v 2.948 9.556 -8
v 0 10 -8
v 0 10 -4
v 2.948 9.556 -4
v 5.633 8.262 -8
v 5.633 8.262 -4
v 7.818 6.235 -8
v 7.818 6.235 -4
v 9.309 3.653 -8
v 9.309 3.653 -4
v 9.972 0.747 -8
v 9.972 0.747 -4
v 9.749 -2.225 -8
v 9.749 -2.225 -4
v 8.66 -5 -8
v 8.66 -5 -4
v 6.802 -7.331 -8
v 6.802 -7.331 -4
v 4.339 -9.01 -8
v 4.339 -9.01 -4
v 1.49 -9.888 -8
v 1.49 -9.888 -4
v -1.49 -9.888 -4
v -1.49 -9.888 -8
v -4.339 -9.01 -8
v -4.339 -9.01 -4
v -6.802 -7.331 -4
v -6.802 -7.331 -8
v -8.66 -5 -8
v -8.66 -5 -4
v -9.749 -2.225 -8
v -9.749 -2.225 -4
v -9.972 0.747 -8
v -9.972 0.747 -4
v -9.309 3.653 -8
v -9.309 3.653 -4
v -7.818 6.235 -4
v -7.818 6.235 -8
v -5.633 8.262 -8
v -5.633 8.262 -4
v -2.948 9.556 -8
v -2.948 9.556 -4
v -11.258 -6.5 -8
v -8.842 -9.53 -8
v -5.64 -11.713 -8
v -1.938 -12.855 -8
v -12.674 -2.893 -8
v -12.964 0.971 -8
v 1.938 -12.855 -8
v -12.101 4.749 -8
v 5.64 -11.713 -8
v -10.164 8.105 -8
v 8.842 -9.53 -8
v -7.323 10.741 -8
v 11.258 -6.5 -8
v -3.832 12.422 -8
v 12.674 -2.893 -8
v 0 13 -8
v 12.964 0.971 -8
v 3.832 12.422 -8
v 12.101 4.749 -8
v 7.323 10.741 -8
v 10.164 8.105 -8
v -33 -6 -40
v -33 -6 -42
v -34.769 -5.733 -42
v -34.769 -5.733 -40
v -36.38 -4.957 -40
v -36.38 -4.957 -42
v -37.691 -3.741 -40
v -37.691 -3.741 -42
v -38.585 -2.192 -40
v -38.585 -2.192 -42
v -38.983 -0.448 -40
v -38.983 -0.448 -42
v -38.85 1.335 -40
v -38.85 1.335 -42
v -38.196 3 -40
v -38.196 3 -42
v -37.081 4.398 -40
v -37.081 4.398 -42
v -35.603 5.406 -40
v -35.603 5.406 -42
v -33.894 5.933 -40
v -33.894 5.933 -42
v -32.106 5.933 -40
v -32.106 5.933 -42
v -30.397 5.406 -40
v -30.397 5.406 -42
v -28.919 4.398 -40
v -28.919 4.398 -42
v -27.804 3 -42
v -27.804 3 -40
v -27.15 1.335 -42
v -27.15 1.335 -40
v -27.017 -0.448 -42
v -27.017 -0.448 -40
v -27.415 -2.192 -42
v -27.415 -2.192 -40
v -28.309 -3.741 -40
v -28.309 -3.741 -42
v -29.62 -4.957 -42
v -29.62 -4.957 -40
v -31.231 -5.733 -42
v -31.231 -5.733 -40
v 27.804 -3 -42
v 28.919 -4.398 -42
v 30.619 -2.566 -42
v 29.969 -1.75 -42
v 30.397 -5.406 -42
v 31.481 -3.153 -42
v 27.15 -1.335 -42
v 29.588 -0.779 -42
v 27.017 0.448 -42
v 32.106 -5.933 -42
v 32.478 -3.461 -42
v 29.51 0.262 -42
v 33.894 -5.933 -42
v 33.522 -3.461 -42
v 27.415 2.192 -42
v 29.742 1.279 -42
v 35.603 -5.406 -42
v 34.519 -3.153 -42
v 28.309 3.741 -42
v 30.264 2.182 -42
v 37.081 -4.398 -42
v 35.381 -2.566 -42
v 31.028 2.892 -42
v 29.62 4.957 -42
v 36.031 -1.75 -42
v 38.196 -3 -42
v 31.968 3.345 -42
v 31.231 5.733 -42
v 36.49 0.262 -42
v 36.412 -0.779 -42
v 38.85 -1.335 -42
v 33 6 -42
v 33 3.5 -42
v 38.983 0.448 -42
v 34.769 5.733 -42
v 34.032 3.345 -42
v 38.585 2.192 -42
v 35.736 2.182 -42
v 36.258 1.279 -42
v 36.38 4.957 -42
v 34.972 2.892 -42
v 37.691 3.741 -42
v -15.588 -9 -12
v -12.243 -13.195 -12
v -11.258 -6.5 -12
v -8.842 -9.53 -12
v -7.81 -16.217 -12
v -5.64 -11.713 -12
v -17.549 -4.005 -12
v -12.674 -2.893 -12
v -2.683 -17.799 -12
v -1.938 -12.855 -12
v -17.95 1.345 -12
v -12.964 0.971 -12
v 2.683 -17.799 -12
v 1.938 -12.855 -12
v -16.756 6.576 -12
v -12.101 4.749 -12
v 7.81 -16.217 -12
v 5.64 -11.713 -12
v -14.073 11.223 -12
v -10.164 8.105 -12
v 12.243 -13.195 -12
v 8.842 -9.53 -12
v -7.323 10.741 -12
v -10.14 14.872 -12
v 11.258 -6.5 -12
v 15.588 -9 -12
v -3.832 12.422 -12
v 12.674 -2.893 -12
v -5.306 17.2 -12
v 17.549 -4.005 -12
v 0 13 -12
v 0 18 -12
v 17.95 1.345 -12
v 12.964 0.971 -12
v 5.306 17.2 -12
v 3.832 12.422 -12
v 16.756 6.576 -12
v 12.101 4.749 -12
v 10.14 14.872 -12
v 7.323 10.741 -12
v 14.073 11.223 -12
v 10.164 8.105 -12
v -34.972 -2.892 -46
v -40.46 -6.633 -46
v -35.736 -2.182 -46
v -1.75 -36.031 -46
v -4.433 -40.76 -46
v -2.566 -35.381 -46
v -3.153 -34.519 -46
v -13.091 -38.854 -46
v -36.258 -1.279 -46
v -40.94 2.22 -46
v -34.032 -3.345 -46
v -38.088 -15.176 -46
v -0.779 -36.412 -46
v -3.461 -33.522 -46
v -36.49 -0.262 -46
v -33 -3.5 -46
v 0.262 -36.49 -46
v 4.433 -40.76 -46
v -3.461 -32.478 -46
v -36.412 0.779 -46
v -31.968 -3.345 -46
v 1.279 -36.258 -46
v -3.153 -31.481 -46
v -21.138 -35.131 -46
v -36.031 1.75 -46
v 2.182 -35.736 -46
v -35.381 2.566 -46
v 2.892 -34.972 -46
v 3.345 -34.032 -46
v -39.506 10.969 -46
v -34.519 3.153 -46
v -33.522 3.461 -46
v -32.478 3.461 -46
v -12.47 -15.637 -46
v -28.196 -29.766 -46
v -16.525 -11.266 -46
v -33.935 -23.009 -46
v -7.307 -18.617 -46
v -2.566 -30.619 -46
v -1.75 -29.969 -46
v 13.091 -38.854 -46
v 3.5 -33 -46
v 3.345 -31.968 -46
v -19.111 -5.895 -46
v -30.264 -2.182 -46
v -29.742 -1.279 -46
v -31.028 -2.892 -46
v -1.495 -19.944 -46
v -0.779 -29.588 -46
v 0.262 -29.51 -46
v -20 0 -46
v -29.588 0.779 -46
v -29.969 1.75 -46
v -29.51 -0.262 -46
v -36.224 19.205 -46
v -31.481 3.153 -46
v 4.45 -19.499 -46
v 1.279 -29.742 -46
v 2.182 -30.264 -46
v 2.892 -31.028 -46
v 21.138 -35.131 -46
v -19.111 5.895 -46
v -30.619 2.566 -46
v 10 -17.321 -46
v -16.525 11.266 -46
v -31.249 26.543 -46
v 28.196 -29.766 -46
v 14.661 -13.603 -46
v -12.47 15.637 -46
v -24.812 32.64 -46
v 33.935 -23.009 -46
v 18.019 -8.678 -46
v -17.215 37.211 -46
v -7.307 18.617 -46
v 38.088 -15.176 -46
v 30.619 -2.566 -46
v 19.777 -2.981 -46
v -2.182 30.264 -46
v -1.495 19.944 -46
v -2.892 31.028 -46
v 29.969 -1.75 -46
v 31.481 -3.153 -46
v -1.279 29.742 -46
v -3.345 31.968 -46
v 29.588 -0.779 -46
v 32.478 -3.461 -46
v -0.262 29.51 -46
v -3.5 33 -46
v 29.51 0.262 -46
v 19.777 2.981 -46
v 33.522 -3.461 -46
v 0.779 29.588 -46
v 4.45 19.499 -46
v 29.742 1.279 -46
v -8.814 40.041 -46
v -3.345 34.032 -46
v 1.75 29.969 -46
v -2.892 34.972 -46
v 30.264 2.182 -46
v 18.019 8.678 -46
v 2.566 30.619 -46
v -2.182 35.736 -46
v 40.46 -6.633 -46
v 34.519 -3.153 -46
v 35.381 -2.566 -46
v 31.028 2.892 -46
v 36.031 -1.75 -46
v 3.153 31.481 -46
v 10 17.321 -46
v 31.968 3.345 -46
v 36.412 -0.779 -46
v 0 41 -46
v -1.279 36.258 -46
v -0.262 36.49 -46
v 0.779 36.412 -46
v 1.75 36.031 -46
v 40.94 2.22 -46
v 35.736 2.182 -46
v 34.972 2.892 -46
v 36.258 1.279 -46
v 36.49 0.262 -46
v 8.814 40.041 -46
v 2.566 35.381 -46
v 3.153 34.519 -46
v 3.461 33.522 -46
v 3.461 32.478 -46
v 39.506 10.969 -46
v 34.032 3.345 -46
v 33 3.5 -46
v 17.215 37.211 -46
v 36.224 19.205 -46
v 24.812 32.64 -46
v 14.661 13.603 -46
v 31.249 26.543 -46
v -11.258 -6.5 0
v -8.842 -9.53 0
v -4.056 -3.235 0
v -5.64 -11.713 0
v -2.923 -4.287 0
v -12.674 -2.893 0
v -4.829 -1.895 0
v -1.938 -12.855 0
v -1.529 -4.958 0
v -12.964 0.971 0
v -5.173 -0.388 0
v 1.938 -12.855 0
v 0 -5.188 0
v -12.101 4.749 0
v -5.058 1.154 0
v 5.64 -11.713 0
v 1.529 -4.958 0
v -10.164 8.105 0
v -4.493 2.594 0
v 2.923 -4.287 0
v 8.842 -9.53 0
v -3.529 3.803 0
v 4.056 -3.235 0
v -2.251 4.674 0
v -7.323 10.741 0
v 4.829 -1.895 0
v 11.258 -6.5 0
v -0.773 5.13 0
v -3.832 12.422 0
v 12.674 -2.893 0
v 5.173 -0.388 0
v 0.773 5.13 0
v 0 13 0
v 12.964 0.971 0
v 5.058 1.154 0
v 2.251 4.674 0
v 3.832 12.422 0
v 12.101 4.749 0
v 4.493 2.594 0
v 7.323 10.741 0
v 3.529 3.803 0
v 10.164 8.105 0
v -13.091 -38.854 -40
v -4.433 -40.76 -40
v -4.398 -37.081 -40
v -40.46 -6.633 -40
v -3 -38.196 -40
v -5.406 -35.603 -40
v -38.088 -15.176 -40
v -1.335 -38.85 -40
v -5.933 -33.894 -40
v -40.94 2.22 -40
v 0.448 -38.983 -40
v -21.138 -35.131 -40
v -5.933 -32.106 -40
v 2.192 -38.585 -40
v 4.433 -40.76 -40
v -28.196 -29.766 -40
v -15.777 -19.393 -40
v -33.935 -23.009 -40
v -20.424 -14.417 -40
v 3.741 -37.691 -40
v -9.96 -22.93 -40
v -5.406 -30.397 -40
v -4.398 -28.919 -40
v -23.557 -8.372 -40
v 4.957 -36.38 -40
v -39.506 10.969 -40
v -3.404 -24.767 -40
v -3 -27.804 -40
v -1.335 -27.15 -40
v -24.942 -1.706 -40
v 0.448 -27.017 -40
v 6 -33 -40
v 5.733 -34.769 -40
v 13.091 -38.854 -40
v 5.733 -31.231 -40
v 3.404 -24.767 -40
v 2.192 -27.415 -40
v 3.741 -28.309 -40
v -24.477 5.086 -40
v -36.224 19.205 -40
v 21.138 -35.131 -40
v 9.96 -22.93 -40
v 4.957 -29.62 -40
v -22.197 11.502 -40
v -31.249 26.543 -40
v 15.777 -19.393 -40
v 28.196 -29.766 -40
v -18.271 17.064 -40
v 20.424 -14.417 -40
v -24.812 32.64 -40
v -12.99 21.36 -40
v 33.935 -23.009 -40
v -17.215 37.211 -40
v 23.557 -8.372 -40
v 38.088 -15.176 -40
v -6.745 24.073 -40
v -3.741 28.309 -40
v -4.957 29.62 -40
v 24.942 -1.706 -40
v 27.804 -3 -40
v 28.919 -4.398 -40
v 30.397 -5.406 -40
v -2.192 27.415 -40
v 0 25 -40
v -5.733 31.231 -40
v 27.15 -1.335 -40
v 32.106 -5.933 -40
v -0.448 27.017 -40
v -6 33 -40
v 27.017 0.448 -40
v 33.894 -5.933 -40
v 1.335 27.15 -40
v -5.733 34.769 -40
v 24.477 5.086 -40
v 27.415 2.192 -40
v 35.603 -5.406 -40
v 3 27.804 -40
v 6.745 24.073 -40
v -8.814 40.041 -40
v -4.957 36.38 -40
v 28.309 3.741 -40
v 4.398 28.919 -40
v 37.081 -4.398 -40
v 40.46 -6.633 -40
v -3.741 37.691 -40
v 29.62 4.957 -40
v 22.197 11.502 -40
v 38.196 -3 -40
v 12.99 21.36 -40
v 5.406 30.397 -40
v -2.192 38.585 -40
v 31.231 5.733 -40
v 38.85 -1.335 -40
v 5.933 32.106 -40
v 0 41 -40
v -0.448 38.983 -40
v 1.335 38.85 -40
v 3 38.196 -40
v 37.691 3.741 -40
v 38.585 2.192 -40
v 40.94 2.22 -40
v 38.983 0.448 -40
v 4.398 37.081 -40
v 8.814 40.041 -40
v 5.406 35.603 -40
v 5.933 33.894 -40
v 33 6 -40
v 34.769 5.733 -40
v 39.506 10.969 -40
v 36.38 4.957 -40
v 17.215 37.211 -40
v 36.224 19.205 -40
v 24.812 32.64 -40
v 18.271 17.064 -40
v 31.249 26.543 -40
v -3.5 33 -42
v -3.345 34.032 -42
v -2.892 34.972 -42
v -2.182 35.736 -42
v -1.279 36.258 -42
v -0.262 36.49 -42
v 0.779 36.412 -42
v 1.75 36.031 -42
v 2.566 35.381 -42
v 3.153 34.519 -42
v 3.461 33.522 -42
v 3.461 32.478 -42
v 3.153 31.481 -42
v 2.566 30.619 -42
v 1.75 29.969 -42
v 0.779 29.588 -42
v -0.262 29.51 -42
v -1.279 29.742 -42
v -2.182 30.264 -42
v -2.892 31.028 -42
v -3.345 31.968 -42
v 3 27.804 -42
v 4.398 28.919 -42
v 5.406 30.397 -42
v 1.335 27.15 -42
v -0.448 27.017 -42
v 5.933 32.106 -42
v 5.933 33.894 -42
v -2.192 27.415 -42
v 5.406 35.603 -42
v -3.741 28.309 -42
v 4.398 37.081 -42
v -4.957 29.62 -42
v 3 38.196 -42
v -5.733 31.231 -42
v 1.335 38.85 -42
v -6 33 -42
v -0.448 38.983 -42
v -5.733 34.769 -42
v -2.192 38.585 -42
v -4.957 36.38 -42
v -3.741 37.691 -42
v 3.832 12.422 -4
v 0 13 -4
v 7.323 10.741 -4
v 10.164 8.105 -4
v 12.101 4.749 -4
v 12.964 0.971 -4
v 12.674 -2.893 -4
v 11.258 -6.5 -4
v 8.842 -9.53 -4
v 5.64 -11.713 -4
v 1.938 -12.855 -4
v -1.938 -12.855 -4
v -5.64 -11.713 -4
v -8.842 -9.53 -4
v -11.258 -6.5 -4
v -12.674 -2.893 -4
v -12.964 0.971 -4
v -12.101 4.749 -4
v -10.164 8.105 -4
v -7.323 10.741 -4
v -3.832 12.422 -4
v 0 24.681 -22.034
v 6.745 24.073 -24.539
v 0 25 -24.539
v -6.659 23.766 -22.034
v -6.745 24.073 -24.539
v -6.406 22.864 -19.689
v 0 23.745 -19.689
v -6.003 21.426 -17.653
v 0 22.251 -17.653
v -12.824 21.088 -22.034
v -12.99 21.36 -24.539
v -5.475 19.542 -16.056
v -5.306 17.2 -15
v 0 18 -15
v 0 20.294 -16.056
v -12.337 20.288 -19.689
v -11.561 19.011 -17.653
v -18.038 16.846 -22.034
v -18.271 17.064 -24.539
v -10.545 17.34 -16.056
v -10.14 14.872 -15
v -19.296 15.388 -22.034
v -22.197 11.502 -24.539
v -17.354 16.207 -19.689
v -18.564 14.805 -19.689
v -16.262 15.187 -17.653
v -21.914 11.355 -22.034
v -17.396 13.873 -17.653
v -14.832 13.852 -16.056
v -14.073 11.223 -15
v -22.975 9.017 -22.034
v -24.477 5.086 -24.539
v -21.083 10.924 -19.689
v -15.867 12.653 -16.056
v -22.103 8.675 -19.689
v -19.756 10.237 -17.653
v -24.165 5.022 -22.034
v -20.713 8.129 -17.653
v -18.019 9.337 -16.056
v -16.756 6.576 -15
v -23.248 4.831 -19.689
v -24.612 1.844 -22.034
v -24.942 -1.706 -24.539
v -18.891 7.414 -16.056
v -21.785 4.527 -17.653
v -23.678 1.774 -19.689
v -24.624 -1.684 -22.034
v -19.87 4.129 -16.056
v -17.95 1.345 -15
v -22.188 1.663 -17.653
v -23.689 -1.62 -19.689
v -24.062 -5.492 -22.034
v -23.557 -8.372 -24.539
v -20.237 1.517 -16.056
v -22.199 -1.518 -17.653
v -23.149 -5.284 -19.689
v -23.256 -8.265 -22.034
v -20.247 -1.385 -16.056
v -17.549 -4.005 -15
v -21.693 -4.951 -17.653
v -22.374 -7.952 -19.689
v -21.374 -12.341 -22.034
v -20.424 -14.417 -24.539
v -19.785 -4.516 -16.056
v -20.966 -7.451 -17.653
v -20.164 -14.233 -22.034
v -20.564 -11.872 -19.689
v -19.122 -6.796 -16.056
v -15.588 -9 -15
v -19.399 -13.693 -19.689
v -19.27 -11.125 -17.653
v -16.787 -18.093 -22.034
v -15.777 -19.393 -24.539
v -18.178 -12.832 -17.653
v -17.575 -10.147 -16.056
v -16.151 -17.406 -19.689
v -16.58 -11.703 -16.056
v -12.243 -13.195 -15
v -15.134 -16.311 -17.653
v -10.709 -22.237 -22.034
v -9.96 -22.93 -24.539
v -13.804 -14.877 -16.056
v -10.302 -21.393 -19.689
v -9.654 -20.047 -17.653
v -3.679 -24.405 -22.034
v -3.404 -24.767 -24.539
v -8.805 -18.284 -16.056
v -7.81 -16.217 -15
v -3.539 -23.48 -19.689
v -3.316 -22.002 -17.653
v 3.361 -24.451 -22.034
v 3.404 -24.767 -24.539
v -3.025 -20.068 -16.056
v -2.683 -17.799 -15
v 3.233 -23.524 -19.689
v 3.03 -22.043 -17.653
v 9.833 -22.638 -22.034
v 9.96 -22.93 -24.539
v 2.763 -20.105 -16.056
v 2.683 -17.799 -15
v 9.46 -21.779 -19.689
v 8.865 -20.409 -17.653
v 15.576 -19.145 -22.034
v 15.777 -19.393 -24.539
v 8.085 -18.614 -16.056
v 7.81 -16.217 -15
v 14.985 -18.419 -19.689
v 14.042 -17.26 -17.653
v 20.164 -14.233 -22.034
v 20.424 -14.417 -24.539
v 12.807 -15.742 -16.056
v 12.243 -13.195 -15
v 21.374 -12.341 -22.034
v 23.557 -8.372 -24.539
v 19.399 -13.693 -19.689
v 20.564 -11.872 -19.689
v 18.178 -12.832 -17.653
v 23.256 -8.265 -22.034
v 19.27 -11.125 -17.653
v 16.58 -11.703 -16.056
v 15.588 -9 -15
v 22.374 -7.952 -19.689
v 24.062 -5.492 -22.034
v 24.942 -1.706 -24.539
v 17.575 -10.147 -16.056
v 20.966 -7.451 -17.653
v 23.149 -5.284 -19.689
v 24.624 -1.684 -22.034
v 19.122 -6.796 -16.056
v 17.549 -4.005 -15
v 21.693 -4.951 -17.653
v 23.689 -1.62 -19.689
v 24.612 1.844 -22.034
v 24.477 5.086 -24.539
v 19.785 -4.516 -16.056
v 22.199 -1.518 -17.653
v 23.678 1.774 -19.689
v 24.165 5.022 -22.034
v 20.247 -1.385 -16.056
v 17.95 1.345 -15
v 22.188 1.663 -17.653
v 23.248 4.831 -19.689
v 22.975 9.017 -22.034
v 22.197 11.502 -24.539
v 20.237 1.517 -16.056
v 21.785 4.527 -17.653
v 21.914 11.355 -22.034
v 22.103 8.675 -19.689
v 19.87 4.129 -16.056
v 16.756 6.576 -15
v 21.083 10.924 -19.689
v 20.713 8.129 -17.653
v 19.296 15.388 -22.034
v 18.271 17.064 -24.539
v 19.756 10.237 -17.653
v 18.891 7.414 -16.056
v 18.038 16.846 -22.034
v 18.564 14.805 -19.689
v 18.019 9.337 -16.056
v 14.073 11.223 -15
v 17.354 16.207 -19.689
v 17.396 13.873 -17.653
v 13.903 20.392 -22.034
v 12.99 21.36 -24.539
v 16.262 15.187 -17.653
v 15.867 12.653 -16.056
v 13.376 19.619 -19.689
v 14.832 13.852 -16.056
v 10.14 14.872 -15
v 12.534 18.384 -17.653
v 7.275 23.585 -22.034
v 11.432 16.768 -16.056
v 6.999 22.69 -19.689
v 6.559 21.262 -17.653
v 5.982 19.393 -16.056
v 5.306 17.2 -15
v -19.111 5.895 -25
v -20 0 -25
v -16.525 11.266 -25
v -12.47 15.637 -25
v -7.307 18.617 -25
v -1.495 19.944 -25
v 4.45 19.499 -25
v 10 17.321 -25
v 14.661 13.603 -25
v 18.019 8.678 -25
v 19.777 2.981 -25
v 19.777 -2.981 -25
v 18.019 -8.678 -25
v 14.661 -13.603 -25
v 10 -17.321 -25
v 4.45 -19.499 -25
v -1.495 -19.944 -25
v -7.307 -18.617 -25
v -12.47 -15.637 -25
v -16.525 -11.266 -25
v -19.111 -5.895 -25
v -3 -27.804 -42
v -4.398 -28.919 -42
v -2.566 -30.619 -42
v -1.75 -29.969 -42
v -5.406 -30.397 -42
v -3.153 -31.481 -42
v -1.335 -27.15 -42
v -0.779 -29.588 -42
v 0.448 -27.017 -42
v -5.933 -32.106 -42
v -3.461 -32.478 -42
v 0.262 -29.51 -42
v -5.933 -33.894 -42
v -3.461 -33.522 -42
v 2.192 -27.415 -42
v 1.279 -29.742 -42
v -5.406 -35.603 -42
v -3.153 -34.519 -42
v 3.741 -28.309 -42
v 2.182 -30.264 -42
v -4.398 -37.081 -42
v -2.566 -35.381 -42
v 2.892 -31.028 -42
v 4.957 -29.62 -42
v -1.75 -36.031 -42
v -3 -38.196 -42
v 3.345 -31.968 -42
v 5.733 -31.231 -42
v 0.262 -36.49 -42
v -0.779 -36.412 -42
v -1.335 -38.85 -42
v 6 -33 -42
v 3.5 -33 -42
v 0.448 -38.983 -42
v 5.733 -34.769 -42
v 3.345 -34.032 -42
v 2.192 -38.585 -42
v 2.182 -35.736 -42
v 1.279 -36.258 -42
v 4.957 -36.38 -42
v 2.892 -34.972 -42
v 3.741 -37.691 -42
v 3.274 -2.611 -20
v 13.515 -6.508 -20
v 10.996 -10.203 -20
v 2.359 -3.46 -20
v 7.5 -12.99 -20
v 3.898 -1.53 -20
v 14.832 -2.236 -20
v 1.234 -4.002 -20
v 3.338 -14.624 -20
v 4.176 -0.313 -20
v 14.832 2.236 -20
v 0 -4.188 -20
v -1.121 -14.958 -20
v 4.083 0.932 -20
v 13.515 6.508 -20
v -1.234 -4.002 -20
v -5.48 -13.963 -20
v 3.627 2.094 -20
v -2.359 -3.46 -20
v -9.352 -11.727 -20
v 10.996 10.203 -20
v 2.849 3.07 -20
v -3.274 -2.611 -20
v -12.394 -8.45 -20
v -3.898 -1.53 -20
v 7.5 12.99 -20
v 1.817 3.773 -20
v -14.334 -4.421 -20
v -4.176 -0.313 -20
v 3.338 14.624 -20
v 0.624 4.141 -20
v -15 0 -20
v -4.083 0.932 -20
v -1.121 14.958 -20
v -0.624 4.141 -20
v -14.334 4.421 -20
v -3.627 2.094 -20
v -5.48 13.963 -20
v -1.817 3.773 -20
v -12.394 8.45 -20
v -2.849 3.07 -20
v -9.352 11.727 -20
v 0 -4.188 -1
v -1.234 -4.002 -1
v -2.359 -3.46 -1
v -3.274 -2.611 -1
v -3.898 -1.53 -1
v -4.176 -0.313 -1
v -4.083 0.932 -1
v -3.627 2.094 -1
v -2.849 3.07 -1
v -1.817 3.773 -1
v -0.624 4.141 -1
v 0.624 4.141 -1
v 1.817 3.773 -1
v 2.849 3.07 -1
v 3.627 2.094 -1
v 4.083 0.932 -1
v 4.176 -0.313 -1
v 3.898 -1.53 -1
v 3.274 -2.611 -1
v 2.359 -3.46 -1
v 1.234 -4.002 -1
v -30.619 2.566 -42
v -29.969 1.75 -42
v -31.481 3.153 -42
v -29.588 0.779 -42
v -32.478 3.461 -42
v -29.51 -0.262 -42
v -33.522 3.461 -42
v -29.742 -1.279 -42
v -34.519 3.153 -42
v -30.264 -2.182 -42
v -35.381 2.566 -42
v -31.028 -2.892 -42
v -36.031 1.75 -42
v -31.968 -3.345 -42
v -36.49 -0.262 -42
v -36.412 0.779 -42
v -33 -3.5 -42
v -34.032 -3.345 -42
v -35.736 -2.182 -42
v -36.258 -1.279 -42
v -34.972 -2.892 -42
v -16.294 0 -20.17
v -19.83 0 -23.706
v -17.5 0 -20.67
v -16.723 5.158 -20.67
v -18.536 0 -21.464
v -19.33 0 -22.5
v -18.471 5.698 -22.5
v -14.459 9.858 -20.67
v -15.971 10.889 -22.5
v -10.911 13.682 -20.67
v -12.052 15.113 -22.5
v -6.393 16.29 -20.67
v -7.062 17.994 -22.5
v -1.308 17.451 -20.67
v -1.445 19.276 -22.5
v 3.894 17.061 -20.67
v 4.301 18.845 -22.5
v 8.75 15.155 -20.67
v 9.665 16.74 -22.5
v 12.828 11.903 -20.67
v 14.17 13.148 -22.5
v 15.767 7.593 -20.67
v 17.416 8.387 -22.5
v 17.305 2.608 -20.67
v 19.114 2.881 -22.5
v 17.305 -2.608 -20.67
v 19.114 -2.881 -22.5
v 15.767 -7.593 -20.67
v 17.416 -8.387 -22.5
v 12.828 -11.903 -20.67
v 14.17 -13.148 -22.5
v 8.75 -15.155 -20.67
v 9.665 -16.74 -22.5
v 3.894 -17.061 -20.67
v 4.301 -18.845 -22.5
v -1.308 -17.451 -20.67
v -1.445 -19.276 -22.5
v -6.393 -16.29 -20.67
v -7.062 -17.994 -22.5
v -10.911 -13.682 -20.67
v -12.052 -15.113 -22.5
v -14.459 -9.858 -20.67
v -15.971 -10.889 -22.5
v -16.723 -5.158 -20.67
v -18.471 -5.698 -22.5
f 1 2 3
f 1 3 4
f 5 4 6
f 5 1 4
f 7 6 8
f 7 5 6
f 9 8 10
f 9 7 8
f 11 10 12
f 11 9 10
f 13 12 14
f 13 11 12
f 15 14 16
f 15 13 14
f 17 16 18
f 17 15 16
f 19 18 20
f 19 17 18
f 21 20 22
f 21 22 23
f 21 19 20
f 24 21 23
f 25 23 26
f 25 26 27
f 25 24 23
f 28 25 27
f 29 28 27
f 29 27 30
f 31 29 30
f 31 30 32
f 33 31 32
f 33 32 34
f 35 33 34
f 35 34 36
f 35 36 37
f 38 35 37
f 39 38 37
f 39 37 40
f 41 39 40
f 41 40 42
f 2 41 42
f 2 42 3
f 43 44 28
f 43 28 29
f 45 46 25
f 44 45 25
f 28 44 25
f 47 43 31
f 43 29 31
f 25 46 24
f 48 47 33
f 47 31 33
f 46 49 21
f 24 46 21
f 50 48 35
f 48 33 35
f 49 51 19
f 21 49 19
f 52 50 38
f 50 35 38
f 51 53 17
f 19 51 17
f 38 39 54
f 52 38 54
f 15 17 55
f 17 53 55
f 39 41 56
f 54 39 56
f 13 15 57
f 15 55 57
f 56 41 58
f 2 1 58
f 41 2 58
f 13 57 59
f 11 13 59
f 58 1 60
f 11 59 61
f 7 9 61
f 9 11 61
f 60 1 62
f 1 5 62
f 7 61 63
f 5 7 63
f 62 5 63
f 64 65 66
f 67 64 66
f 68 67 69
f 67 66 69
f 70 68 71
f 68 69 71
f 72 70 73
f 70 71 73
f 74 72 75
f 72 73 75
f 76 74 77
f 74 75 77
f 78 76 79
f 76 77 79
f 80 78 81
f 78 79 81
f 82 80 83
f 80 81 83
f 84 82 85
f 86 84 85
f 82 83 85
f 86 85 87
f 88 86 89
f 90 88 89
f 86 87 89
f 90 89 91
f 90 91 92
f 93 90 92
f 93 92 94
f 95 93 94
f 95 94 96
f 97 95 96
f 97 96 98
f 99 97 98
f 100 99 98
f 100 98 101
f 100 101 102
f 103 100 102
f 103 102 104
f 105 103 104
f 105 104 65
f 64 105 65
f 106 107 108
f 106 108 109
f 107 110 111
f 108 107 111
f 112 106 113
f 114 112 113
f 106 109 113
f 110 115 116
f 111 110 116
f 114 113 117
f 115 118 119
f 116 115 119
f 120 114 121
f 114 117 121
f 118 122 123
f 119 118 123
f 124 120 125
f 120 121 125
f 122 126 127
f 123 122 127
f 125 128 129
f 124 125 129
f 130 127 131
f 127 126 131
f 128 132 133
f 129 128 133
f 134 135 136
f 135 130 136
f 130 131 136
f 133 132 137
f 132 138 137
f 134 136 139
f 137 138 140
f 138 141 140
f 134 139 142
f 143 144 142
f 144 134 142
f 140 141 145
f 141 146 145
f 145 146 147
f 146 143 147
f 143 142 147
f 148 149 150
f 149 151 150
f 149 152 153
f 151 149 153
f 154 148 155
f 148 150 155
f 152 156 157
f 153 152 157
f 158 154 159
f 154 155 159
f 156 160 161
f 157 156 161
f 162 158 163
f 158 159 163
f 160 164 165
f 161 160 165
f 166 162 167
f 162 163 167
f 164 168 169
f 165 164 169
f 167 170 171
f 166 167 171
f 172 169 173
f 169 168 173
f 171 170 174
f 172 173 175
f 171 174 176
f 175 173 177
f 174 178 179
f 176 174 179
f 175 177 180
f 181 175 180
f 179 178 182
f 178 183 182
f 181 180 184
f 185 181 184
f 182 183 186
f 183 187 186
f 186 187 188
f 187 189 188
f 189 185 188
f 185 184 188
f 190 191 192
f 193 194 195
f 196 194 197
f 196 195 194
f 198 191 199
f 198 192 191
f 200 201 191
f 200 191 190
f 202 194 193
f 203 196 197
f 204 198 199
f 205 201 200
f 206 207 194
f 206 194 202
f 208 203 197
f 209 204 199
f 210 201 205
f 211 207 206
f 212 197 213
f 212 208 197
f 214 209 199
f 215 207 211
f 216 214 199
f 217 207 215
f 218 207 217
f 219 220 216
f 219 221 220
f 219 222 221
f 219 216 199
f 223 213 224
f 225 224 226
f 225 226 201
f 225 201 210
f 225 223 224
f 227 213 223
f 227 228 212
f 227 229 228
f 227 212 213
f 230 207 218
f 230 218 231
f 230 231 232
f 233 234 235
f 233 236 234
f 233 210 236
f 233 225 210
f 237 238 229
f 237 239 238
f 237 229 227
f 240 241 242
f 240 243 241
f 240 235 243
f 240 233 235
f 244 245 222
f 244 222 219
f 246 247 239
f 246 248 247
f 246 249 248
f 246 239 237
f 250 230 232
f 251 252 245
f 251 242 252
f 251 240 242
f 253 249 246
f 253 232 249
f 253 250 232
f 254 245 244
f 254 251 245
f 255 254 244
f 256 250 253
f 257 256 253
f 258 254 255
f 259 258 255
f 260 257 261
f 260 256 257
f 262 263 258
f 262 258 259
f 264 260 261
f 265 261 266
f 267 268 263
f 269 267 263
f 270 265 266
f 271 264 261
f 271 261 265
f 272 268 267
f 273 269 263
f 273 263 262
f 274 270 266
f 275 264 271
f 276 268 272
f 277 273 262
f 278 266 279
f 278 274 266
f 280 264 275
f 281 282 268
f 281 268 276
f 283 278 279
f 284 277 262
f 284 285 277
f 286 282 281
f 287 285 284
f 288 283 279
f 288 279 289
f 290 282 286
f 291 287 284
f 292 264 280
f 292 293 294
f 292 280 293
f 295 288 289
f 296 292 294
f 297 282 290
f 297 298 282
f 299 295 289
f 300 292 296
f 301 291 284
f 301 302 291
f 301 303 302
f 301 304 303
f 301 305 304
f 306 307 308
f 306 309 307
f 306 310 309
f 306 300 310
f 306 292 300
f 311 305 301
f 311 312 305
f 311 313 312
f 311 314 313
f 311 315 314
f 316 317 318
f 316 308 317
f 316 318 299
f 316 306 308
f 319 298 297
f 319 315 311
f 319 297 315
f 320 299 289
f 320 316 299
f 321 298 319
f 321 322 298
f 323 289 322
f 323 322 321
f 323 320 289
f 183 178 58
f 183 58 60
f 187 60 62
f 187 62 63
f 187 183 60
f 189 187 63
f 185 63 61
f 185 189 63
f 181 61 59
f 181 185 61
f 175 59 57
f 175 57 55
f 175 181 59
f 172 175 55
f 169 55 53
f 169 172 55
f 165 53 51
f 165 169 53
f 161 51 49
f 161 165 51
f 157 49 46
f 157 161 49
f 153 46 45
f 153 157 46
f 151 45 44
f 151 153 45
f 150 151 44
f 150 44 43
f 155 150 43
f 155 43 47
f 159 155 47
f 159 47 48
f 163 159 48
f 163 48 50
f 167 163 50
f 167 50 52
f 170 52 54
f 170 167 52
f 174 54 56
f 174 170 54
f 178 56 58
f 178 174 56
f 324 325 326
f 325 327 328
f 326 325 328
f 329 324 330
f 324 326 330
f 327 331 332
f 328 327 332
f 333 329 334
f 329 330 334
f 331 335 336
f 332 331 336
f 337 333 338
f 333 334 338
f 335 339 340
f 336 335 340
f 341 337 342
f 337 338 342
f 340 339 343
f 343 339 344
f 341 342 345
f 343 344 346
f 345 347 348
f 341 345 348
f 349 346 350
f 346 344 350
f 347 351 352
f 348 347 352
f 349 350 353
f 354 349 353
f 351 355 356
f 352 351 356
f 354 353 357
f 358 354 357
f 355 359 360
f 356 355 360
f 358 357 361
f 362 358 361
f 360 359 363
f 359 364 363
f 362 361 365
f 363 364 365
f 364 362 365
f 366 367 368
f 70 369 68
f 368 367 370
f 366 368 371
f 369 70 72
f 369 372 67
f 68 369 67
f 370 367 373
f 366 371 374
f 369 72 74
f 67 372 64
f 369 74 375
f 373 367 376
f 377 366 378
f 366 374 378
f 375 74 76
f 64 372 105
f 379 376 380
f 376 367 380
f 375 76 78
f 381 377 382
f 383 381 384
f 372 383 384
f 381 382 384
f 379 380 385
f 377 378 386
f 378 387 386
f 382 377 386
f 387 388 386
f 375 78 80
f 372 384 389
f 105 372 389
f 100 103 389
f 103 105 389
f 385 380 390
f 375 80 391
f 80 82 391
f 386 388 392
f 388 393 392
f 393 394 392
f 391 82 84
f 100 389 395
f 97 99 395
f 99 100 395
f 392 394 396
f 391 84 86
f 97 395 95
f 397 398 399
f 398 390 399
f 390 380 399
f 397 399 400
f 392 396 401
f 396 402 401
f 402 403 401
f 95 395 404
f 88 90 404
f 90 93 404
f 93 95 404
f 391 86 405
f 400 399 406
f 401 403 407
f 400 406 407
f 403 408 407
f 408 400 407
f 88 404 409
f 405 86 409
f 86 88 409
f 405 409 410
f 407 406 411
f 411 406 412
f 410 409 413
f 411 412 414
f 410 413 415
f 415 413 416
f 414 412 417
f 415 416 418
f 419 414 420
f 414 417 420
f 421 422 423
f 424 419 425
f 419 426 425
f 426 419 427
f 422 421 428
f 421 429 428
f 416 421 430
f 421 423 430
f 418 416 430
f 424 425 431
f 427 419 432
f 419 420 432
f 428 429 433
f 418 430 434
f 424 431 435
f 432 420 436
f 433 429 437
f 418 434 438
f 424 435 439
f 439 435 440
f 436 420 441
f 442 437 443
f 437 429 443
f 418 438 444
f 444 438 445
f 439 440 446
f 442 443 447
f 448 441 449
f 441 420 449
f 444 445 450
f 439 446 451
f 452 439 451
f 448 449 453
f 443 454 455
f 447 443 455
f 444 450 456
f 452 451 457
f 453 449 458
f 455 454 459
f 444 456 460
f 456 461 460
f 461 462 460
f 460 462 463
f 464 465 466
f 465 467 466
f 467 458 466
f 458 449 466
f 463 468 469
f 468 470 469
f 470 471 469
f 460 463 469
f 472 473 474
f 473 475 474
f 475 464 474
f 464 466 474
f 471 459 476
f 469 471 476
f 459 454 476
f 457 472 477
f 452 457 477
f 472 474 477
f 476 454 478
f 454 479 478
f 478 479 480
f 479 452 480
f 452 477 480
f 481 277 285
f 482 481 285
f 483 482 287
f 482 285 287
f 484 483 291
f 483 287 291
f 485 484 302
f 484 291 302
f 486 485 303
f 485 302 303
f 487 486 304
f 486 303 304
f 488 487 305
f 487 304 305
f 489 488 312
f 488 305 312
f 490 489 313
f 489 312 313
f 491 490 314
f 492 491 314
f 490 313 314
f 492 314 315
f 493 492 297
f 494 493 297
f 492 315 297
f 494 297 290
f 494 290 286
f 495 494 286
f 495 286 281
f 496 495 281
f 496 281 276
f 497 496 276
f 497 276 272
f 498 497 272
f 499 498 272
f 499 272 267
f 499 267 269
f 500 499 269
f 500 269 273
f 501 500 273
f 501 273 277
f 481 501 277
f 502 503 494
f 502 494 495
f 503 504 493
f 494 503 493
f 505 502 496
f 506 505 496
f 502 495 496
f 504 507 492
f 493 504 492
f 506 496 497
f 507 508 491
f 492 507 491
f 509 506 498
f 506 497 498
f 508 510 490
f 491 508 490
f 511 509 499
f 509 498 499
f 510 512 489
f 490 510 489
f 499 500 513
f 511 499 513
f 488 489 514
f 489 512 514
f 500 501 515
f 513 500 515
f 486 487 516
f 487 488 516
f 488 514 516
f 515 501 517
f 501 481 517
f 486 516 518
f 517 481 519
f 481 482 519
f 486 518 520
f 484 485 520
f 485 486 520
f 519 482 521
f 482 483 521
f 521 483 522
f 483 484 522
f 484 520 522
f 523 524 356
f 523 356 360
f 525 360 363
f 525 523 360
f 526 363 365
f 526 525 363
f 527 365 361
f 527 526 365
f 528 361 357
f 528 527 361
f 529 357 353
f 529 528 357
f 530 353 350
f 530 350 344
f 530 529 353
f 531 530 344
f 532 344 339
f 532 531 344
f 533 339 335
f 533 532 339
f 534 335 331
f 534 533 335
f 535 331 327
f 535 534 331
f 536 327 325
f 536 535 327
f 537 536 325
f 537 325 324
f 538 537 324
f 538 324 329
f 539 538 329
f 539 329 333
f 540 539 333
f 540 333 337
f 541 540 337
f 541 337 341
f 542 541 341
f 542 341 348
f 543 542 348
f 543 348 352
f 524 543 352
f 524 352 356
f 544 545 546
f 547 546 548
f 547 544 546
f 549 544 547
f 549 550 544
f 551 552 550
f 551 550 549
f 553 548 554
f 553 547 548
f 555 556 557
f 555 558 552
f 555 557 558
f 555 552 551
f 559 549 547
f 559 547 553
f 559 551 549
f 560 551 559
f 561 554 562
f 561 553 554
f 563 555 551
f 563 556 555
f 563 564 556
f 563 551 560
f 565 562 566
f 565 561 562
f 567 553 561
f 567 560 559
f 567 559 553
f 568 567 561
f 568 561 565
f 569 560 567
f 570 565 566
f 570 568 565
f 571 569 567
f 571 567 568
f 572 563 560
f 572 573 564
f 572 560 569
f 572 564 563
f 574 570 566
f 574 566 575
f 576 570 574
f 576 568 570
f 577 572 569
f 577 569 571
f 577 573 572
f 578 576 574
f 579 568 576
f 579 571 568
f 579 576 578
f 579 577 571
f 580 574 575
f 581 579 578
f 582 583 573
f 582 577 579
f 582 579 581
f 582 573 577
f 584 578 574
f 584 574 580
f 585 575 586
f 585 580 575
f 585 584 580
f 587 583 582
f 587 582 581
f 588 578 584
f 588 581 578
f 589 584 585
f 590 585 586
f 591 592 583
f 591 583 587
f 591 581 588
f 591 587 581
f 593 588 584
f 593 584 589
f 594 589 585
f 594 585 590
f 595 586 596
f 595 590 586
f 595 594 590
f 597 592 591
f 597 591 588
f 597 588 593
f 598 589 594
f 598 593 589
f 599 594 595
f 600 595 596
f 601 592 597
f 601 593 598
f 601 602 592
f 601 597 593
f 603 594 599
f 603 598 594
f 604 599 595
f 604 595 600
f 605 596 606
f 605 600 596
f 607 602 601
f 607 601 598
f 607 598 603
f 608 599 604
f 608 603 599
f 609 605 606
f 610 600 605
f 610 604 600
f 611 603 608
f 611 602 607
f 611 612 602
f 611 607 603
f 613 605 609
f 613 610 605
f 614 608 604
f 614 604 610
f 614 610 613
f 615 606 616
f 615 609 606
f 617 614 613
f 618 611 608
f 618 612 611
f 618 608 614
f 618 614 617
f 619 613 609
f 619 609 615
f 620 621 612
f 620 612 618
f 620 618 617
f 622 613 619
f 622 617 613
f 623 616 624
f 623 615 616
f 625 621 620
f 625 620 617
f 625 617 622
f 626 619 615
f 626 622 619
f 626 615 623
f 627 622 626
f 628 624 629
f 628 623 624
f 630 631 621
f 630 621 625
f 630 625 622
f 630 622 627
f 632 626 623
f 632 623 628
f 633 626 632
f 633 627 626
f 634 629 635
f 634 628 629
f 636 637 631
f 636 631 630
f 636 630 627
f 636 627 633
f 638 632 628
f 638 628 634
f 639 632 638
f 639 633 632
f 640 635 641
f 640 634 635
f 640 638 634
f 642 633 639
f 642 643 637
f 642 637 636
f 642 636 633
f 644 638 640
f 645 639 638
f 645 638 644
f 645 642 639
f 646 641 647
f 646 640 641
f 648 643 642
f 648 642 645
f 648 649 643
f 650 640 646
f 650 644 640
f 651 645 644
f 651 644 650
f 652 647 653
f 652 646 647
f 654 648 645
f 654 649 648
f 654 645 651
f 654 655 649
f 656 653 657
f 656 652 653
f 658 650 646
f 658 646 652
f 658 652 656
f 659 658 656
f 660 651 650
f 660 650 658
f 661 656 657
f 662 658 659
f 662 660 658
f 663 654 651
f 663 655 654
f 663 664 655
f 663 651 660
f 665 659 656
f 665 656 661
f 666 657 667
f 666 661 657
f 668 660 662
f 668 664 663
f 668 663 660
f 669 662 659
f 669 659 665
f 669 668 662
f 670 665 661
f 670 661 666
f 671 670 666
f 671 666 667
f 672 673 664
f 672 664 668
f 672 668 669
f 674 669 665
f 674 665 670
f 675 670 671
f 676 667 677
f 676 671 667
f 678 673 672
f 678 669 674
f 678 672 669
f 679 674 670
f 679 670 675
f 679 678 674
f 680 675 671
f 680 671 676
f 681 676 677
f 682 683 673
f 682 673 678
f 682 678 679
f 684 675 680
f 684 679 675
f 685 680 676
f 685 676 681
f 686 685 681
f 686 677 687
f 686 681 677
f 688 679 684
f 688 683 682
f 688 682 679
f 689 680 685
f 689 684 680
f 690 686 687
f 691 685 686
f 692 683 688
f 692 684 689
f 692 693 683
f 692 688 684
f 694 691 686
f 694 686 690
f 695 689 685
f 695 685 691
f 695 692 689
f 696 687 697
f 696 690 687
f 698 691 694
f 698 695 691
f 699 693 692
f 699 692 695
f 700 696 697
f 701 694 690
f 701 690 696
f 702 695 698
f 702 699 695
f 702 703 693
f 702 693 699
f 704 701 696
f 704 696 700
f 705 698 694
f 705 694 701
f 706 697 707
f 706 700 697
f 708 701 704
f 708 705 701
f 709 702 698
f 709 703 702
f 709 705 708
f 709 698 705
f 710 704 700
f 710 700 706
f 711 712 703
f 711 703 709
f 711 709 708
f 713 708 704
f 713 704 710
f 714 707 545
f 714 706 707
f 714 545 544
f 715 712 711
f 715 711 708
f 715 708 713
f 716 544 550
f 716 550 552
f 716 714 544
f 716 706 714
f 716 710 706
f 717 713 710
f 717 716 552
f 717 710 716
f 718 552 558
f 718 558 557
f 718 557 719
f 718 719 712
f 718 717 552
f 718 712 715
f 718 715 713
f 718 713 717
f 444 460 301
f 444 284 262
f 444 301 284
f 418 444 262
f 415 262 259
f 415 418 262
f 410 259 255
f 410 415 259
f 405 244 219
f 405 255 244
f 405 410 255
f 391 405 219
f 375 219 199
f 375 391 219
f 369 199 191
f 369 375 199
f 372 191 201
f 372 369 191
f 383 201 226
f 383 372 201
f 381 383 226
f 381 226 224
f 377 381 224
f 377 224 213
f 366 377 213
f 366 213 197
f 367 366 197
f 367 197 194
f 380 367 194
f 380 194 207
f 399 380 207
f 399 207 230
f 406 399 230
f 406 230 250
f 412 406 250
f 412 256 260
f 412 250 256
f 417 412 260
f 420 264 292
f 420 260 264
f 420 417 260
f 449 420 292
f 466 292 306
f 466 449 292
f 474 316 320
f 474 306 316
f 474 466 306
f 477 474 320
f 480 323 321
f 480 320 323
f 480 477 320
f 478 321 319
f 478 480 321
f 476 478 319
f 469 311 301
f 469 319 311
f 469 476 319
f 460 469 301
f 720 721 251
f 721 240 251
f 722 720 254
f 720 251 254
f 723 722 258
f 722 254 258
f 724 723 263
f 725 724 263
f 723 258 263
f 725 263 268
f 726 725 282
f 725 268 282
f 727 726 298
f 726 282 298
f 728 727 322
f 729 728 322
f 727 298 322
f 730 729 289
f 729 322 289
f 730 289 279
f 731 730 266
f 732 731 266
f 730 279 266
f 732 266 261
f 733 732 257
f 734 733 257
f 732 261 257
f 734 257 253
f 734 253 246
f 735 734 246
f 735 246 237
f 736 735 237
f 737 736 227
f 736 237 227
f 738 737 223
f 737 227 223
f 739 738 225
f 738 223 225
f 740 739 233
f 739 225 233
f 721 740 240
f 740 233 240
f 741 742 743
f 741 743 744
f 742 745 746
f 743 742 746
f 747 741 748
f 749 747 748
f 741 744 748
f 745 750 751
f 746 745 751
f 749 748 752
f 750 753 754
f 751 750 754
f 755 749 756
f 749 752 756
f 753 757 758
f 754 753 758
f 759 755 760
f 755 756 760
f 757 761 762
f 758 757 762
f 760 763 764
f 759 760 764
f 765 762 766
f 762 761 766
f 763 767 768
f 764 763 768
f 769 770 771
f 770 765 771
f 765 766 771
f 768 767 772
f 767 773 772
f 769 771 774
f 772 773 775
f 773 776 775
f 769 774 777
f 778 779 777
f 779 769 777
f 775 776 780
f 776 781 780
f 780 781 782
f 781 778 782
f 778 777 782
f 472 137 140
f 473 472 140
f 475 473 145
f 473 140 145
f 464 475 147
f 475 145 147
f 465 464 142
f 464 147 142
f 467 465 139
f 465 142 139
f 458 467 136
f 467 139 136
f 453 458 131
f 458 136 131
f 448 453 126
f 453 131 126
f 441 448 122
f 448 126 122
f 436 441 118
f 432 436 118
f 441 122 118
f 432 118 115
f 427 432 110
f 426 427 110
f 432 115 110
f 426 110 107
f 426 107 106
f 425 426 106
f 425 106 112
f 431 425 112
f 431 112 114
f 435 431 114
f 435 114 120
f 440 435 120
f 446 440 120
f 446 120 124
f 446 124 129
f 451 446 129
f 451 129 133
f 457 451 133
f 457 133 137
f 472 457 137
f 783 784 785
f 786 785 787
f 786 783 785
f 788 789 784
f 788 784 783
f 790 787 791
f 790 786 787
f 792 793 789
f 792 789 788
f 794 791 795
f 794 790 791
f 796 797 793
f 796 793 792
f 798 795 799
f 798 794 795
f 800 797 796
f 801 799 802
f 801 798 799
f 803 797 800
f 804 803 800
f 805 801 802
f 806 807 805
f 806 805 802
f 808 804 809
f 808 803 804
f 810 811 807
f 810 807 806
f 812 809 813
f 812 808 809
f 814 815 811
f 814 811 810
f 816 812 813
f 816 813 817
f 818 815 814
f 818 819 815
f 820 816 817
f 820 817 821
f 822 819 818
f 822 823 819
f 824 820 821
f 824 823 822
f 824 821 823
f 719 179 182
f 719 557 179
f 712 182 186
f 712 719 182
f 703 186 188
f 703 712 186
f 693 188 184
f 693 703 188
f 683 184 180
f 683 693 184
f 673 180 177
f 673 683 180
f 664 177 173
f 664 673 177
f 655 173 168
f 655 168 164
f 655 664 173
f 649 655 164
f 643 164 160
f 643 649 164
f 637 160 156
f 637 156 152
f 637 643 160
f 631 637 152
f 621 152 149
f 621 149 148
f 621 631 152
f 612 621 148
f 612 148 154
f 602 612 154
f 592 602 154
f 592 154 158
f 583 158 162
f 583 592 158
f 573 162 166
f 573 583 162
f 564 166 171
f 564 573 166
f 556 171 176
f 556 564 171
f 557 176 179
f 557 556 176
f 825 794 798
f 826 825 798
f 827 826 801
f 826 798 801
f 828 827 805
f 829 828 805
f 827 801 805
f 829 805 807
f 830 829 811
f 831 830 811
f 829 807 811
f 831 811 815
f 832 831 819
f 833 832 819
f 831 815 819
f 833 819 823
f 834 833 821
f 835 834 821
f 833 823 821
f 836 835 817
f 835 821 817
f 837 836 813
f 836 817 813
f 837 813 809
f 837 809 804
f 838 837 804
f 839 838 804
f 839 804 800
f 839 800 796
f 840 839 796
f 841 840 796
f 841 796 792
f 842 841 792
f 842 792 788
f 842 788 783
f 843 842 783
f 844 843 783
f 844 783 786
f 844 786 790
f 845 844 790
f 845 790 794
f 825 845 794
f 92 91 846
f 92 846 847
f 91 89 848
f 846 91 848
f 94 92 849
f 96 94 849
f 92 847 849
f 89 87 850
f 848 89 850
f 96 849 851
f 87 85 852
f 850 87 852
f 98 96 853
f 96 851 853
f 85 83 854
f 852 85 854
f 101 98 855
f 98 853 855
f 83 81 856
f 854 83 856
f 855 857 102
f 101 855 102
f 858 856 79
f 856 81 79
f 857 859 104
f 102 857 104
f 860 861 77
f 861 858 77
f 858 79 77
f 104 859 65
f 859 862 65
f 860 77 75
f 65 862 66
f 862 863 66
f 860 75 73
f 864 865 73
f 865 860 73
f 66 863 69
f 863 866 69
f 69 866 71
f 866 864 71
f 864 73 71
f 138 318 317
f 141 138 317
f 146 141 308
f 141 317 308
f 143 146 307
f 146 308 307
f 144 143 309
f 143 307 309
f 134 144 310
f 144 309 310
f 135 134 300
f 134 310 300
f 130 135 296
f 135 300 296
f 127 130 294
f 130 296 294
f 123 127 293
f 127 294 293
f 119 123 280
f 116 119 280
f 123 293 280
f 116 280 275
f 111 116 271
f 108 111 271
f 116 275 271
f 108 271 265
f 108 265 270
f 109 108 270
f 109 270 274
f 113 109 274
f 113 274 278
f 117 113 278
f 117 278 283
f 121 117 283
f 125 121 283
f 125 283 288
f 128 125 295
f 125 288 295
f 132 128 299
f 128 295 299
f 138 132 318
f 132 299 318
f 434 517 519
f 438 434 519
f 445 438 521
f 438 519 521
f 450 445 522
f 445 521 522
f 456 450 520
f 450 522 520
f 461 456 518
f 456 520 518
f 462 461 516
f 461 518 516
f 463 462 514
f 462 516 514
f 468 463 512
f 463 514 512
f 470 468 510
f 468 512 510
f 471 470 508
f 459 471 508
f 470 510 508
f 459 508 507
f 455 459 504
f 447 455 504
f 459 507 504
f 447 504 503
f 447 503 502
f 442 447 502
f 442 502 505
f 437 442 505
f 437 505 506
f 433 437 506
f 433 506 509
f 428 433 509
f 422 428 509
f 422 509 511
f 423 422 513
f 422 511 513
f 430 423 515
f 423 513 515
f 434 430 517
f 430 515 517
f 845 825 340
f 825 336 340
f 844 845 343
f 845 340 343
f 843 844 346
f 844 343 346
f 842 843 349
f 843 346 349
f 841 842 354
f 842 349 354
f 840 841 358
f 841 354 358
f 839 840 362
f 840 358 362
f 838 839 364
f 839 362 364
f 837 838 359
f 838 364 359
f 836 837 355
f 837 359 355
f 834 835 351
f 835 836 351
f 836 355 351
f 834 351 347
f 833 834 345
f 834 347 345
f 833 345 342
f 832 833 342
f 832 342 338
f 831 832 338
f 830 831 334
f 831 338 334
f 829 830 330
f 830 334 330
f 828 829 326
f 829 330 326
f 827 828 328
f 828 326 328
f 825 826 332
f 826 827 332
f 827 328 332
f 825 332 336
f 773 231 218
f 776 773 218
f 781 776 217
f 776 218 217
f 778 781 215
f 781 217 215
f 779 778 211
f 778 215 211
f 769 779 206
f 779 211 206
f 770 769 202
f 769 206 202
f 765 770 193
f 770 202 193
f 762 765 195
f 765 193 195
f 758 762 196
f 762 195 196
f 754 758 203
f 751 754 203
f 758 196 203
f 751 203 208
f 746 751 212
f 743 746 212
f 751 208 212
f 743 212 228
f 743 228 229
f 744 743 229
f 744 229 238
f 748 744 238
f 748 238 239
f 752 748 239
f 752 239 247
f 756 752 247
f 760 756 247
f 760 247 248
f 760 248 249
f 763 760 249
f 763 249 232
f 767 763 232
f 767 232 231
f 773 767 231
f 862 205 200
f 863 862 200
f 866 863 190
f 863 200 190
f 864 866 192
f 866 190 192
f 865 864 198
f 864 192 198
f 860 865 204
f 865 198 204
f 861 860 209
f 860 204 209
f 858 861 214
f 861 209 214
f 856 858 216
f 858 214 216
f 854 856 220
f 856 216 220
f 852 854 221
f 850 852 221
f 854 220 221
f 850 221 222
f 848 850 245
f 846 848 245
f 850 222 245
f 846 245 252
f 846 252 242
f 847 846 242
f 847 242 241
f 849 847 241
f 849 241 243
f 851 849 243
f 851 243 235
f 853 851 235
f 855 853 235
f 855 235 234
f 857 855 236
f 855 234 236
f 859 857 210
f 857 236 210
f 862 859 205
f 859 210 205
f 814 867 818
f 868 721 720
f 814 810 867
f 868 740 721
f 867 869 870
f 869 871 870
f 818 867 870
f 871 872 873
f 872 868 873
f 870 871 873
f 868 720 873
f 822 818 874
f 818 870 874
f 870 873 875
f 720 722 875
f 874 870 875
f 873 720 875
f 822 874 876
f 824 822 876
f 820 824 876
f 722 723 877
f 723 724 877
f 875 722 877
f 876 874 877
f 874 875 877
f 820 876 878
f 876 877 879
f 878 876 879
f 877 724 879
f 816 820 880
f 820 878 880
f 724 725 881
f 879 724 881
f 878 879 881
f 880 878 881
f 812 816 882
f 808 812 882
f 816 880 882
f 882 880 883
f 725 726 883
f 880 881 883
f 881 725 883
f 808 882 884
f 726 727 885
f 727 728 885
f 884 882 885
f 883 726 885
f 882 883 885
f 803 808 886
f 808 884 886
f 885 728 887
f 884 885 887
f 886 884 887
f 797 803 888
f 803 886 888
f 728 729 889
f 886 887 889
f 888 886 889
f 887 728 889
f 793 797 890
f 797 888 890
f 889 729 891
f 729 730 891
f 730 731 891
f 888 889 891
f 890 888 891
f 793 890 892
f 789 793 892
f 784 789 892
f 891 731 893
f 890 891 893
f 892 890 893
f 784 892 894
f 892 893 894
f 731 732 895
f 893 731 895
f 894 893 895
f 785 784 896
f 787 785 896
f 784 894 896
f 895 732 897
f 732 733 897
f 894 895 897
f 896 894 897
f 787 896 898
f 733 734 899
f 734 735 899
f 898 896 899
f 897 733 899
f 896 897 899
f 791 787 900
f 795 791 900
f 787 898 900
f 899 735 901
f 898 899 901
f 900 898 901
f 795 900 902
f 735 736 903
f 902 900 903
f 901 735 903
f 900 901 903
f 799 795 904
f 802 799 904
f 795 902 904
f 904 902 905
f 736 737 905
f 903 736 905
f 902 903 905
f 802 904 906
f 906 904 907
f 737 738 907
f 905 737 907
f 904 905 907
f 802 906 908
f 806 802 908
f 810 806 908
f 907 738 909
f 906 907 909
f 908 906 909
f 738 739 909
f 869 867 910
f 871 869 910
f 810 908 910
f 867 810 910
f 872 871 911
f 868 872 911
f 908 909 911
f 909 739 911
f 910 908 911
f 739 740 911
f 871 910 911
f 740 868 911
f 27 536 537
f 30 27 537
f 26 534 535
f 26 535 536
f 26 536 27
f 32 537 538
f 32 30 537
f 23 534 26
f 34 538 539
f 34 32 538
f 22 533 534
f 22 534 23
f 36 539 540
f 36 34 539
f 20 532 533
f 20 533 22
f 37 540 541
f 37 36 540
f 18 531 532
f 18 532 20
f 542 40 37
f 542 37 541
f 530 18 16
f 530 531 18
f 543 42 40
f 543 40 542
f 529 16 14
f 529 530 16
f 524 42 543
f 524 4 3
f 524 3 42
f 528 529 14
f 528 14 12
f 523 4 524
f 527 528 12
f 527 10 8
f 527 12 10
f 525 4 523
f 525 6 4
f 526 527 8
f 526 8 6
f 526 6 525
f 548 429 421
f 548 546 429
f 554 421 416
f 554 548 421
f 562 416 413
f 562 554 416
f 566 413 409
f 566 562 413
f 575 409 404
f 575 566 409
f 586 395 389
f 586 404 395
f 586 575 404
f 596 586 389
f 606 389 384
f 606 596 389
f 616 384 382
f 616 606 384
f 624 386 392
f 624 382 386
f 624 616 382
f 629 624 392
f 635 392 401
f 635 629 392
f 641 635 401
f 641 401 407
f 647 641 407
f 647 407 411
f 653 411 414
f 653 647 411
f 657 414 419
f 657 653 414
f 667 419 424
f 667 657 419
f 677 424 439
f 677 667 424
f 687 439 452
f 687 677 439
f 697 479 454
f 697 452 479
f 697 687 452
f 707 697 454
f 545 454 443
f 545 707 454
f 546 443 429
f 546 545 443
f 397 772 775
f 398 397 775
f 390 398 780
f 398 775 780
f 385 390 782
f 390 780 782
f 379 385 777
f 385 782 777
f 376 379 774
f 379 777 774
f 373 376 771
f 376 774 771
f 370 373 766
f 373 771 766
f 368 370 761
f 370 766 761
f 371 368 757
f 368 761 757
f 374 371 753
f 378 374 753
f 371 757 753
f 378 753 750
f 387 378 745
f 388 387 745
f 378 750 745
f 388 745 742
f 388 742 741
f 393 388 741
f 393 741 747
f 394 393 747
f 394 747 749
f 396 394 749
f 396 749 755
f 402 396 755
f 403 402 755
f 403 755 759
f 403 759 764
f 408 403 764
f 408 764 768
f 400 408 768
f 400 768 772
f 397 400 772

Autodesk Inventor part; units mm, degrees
ref_plane "YZ Plane" through (0, 0, 0) normal (1, 0, 0) x (0, 1, 0)
ref_plane "XZ Plane" through (0, 0, 0) normal (0, 1, 0) x (-1, 0, 0)
ref_plane "XY Plane" through (0, 0, 0) normal (0, 0, 1) x (1, 0, 0)
sketch "草图1" plane through (0, 0, 0) normal (1, 0, 0) x (0, 1, 0)
  line L0 (0, 0) -> (13, 0)
  line L1 (13, 0) -> (13, -4)
  line L2 (13, -4) -> (10, -4)
  line L3 (10, -4) -> (10, -8)
  line L4 (10, -8) -> (13, -8)
  line L5 (13, -8) -> (13, -12)
  line L6 (13, -12) -> (18, -12)
  line L7 (18, -12) -> (18, -15)
  line L8 (0, 0) -> (0, -15)
  line L9 (18, -15) -> (25, -15)
  line L10 (0, 0) -> (0, -46)
  line L11 (0, -46) -> (41, -46)
  line L12 (41, -46) -> (41, -40)
  line L13 (41, -40) -> (25, -40)
  line L14 (25, -40) -> (25, -15)
  dimension "d0" = 13
  dimension "d1" = 4
  dimension "d2" = 3
  dimension "d3" = 4
  dimension "d4" = 3
  dimension "d5" = 4
  dimension "d6" = 5
  dimension "d7" = 3
  dimension "d8" = 25
  dimension "d9" = 46
  dimension "d10" = 41
  dimension "d11" = 6
  dimension "d12" = 16
revolve "旋转1" add sketch "草图1" angle 360 about axis through (0, 0, 0) along (0, 0, -1)
sketch "草图2" plane through (0, 0, 0) normal (0, 0, 1) x (1, 0, 0)
  circle A0 centre (0, 0) radius 13 projected
hole "孔1" at (0, 0, 0) direction (0, 0, -1) diameter 8.376 end through all thread size "M10x1.5" designation "M10" class "6H" standard "GB Metric profile"
sketch "草图3" plane through (0, 0, -46) normal (0, 0, -1) x (-1, 0, 0)
  circle A0 centre (0, 0) radius 4.188 projected
  circle A1 centre (0, 0) radius 41 projected
  circle A2 centre (0, 0) radius 20
  dimension "d21" = 40
extrude "拉伸1" cut sketch "草图3" against normal blind 26 contours A2
fillet "圆角1" radius 5 1 edges at (20, 0, -20)
fillet "圆角2" radius 10 1 edges at (0, -25, -15)
sketch "草图4" plane through (0, 0, -40) normal (0, 0, 1) x (1, 0, 0)
  circle A0 centre (0, 0) radius 41 projected
  circle A1 centre (0, 0) radius 33
  point P0 (-33, 0)
  dimension "d26" = 66
hole "孔2" at (-33, 0, -40) direction (0, 0, -1) diameter 7 end through all
sketch "草图5" plane through (0, 0, -40) normal (0, 0, 1) x (1, 0, 0)
  circle A0 centre (-33, 0) radius 3.5 projected
  point P0 (0, 0)
hole "孔3" at (-33, 0, -40) direction (0, 0, -1) diameter 12 depth 2
pattern_circular "环形阵列1" count 4 over 360 about axis through (0, 0, -124.7558) along (0, 0, 1) of "孔3", "孔2"
chamfer "倒角1" distance 1 angle 45 1 edges at (0, 4.188, 0)
properties material "灰口铁"
